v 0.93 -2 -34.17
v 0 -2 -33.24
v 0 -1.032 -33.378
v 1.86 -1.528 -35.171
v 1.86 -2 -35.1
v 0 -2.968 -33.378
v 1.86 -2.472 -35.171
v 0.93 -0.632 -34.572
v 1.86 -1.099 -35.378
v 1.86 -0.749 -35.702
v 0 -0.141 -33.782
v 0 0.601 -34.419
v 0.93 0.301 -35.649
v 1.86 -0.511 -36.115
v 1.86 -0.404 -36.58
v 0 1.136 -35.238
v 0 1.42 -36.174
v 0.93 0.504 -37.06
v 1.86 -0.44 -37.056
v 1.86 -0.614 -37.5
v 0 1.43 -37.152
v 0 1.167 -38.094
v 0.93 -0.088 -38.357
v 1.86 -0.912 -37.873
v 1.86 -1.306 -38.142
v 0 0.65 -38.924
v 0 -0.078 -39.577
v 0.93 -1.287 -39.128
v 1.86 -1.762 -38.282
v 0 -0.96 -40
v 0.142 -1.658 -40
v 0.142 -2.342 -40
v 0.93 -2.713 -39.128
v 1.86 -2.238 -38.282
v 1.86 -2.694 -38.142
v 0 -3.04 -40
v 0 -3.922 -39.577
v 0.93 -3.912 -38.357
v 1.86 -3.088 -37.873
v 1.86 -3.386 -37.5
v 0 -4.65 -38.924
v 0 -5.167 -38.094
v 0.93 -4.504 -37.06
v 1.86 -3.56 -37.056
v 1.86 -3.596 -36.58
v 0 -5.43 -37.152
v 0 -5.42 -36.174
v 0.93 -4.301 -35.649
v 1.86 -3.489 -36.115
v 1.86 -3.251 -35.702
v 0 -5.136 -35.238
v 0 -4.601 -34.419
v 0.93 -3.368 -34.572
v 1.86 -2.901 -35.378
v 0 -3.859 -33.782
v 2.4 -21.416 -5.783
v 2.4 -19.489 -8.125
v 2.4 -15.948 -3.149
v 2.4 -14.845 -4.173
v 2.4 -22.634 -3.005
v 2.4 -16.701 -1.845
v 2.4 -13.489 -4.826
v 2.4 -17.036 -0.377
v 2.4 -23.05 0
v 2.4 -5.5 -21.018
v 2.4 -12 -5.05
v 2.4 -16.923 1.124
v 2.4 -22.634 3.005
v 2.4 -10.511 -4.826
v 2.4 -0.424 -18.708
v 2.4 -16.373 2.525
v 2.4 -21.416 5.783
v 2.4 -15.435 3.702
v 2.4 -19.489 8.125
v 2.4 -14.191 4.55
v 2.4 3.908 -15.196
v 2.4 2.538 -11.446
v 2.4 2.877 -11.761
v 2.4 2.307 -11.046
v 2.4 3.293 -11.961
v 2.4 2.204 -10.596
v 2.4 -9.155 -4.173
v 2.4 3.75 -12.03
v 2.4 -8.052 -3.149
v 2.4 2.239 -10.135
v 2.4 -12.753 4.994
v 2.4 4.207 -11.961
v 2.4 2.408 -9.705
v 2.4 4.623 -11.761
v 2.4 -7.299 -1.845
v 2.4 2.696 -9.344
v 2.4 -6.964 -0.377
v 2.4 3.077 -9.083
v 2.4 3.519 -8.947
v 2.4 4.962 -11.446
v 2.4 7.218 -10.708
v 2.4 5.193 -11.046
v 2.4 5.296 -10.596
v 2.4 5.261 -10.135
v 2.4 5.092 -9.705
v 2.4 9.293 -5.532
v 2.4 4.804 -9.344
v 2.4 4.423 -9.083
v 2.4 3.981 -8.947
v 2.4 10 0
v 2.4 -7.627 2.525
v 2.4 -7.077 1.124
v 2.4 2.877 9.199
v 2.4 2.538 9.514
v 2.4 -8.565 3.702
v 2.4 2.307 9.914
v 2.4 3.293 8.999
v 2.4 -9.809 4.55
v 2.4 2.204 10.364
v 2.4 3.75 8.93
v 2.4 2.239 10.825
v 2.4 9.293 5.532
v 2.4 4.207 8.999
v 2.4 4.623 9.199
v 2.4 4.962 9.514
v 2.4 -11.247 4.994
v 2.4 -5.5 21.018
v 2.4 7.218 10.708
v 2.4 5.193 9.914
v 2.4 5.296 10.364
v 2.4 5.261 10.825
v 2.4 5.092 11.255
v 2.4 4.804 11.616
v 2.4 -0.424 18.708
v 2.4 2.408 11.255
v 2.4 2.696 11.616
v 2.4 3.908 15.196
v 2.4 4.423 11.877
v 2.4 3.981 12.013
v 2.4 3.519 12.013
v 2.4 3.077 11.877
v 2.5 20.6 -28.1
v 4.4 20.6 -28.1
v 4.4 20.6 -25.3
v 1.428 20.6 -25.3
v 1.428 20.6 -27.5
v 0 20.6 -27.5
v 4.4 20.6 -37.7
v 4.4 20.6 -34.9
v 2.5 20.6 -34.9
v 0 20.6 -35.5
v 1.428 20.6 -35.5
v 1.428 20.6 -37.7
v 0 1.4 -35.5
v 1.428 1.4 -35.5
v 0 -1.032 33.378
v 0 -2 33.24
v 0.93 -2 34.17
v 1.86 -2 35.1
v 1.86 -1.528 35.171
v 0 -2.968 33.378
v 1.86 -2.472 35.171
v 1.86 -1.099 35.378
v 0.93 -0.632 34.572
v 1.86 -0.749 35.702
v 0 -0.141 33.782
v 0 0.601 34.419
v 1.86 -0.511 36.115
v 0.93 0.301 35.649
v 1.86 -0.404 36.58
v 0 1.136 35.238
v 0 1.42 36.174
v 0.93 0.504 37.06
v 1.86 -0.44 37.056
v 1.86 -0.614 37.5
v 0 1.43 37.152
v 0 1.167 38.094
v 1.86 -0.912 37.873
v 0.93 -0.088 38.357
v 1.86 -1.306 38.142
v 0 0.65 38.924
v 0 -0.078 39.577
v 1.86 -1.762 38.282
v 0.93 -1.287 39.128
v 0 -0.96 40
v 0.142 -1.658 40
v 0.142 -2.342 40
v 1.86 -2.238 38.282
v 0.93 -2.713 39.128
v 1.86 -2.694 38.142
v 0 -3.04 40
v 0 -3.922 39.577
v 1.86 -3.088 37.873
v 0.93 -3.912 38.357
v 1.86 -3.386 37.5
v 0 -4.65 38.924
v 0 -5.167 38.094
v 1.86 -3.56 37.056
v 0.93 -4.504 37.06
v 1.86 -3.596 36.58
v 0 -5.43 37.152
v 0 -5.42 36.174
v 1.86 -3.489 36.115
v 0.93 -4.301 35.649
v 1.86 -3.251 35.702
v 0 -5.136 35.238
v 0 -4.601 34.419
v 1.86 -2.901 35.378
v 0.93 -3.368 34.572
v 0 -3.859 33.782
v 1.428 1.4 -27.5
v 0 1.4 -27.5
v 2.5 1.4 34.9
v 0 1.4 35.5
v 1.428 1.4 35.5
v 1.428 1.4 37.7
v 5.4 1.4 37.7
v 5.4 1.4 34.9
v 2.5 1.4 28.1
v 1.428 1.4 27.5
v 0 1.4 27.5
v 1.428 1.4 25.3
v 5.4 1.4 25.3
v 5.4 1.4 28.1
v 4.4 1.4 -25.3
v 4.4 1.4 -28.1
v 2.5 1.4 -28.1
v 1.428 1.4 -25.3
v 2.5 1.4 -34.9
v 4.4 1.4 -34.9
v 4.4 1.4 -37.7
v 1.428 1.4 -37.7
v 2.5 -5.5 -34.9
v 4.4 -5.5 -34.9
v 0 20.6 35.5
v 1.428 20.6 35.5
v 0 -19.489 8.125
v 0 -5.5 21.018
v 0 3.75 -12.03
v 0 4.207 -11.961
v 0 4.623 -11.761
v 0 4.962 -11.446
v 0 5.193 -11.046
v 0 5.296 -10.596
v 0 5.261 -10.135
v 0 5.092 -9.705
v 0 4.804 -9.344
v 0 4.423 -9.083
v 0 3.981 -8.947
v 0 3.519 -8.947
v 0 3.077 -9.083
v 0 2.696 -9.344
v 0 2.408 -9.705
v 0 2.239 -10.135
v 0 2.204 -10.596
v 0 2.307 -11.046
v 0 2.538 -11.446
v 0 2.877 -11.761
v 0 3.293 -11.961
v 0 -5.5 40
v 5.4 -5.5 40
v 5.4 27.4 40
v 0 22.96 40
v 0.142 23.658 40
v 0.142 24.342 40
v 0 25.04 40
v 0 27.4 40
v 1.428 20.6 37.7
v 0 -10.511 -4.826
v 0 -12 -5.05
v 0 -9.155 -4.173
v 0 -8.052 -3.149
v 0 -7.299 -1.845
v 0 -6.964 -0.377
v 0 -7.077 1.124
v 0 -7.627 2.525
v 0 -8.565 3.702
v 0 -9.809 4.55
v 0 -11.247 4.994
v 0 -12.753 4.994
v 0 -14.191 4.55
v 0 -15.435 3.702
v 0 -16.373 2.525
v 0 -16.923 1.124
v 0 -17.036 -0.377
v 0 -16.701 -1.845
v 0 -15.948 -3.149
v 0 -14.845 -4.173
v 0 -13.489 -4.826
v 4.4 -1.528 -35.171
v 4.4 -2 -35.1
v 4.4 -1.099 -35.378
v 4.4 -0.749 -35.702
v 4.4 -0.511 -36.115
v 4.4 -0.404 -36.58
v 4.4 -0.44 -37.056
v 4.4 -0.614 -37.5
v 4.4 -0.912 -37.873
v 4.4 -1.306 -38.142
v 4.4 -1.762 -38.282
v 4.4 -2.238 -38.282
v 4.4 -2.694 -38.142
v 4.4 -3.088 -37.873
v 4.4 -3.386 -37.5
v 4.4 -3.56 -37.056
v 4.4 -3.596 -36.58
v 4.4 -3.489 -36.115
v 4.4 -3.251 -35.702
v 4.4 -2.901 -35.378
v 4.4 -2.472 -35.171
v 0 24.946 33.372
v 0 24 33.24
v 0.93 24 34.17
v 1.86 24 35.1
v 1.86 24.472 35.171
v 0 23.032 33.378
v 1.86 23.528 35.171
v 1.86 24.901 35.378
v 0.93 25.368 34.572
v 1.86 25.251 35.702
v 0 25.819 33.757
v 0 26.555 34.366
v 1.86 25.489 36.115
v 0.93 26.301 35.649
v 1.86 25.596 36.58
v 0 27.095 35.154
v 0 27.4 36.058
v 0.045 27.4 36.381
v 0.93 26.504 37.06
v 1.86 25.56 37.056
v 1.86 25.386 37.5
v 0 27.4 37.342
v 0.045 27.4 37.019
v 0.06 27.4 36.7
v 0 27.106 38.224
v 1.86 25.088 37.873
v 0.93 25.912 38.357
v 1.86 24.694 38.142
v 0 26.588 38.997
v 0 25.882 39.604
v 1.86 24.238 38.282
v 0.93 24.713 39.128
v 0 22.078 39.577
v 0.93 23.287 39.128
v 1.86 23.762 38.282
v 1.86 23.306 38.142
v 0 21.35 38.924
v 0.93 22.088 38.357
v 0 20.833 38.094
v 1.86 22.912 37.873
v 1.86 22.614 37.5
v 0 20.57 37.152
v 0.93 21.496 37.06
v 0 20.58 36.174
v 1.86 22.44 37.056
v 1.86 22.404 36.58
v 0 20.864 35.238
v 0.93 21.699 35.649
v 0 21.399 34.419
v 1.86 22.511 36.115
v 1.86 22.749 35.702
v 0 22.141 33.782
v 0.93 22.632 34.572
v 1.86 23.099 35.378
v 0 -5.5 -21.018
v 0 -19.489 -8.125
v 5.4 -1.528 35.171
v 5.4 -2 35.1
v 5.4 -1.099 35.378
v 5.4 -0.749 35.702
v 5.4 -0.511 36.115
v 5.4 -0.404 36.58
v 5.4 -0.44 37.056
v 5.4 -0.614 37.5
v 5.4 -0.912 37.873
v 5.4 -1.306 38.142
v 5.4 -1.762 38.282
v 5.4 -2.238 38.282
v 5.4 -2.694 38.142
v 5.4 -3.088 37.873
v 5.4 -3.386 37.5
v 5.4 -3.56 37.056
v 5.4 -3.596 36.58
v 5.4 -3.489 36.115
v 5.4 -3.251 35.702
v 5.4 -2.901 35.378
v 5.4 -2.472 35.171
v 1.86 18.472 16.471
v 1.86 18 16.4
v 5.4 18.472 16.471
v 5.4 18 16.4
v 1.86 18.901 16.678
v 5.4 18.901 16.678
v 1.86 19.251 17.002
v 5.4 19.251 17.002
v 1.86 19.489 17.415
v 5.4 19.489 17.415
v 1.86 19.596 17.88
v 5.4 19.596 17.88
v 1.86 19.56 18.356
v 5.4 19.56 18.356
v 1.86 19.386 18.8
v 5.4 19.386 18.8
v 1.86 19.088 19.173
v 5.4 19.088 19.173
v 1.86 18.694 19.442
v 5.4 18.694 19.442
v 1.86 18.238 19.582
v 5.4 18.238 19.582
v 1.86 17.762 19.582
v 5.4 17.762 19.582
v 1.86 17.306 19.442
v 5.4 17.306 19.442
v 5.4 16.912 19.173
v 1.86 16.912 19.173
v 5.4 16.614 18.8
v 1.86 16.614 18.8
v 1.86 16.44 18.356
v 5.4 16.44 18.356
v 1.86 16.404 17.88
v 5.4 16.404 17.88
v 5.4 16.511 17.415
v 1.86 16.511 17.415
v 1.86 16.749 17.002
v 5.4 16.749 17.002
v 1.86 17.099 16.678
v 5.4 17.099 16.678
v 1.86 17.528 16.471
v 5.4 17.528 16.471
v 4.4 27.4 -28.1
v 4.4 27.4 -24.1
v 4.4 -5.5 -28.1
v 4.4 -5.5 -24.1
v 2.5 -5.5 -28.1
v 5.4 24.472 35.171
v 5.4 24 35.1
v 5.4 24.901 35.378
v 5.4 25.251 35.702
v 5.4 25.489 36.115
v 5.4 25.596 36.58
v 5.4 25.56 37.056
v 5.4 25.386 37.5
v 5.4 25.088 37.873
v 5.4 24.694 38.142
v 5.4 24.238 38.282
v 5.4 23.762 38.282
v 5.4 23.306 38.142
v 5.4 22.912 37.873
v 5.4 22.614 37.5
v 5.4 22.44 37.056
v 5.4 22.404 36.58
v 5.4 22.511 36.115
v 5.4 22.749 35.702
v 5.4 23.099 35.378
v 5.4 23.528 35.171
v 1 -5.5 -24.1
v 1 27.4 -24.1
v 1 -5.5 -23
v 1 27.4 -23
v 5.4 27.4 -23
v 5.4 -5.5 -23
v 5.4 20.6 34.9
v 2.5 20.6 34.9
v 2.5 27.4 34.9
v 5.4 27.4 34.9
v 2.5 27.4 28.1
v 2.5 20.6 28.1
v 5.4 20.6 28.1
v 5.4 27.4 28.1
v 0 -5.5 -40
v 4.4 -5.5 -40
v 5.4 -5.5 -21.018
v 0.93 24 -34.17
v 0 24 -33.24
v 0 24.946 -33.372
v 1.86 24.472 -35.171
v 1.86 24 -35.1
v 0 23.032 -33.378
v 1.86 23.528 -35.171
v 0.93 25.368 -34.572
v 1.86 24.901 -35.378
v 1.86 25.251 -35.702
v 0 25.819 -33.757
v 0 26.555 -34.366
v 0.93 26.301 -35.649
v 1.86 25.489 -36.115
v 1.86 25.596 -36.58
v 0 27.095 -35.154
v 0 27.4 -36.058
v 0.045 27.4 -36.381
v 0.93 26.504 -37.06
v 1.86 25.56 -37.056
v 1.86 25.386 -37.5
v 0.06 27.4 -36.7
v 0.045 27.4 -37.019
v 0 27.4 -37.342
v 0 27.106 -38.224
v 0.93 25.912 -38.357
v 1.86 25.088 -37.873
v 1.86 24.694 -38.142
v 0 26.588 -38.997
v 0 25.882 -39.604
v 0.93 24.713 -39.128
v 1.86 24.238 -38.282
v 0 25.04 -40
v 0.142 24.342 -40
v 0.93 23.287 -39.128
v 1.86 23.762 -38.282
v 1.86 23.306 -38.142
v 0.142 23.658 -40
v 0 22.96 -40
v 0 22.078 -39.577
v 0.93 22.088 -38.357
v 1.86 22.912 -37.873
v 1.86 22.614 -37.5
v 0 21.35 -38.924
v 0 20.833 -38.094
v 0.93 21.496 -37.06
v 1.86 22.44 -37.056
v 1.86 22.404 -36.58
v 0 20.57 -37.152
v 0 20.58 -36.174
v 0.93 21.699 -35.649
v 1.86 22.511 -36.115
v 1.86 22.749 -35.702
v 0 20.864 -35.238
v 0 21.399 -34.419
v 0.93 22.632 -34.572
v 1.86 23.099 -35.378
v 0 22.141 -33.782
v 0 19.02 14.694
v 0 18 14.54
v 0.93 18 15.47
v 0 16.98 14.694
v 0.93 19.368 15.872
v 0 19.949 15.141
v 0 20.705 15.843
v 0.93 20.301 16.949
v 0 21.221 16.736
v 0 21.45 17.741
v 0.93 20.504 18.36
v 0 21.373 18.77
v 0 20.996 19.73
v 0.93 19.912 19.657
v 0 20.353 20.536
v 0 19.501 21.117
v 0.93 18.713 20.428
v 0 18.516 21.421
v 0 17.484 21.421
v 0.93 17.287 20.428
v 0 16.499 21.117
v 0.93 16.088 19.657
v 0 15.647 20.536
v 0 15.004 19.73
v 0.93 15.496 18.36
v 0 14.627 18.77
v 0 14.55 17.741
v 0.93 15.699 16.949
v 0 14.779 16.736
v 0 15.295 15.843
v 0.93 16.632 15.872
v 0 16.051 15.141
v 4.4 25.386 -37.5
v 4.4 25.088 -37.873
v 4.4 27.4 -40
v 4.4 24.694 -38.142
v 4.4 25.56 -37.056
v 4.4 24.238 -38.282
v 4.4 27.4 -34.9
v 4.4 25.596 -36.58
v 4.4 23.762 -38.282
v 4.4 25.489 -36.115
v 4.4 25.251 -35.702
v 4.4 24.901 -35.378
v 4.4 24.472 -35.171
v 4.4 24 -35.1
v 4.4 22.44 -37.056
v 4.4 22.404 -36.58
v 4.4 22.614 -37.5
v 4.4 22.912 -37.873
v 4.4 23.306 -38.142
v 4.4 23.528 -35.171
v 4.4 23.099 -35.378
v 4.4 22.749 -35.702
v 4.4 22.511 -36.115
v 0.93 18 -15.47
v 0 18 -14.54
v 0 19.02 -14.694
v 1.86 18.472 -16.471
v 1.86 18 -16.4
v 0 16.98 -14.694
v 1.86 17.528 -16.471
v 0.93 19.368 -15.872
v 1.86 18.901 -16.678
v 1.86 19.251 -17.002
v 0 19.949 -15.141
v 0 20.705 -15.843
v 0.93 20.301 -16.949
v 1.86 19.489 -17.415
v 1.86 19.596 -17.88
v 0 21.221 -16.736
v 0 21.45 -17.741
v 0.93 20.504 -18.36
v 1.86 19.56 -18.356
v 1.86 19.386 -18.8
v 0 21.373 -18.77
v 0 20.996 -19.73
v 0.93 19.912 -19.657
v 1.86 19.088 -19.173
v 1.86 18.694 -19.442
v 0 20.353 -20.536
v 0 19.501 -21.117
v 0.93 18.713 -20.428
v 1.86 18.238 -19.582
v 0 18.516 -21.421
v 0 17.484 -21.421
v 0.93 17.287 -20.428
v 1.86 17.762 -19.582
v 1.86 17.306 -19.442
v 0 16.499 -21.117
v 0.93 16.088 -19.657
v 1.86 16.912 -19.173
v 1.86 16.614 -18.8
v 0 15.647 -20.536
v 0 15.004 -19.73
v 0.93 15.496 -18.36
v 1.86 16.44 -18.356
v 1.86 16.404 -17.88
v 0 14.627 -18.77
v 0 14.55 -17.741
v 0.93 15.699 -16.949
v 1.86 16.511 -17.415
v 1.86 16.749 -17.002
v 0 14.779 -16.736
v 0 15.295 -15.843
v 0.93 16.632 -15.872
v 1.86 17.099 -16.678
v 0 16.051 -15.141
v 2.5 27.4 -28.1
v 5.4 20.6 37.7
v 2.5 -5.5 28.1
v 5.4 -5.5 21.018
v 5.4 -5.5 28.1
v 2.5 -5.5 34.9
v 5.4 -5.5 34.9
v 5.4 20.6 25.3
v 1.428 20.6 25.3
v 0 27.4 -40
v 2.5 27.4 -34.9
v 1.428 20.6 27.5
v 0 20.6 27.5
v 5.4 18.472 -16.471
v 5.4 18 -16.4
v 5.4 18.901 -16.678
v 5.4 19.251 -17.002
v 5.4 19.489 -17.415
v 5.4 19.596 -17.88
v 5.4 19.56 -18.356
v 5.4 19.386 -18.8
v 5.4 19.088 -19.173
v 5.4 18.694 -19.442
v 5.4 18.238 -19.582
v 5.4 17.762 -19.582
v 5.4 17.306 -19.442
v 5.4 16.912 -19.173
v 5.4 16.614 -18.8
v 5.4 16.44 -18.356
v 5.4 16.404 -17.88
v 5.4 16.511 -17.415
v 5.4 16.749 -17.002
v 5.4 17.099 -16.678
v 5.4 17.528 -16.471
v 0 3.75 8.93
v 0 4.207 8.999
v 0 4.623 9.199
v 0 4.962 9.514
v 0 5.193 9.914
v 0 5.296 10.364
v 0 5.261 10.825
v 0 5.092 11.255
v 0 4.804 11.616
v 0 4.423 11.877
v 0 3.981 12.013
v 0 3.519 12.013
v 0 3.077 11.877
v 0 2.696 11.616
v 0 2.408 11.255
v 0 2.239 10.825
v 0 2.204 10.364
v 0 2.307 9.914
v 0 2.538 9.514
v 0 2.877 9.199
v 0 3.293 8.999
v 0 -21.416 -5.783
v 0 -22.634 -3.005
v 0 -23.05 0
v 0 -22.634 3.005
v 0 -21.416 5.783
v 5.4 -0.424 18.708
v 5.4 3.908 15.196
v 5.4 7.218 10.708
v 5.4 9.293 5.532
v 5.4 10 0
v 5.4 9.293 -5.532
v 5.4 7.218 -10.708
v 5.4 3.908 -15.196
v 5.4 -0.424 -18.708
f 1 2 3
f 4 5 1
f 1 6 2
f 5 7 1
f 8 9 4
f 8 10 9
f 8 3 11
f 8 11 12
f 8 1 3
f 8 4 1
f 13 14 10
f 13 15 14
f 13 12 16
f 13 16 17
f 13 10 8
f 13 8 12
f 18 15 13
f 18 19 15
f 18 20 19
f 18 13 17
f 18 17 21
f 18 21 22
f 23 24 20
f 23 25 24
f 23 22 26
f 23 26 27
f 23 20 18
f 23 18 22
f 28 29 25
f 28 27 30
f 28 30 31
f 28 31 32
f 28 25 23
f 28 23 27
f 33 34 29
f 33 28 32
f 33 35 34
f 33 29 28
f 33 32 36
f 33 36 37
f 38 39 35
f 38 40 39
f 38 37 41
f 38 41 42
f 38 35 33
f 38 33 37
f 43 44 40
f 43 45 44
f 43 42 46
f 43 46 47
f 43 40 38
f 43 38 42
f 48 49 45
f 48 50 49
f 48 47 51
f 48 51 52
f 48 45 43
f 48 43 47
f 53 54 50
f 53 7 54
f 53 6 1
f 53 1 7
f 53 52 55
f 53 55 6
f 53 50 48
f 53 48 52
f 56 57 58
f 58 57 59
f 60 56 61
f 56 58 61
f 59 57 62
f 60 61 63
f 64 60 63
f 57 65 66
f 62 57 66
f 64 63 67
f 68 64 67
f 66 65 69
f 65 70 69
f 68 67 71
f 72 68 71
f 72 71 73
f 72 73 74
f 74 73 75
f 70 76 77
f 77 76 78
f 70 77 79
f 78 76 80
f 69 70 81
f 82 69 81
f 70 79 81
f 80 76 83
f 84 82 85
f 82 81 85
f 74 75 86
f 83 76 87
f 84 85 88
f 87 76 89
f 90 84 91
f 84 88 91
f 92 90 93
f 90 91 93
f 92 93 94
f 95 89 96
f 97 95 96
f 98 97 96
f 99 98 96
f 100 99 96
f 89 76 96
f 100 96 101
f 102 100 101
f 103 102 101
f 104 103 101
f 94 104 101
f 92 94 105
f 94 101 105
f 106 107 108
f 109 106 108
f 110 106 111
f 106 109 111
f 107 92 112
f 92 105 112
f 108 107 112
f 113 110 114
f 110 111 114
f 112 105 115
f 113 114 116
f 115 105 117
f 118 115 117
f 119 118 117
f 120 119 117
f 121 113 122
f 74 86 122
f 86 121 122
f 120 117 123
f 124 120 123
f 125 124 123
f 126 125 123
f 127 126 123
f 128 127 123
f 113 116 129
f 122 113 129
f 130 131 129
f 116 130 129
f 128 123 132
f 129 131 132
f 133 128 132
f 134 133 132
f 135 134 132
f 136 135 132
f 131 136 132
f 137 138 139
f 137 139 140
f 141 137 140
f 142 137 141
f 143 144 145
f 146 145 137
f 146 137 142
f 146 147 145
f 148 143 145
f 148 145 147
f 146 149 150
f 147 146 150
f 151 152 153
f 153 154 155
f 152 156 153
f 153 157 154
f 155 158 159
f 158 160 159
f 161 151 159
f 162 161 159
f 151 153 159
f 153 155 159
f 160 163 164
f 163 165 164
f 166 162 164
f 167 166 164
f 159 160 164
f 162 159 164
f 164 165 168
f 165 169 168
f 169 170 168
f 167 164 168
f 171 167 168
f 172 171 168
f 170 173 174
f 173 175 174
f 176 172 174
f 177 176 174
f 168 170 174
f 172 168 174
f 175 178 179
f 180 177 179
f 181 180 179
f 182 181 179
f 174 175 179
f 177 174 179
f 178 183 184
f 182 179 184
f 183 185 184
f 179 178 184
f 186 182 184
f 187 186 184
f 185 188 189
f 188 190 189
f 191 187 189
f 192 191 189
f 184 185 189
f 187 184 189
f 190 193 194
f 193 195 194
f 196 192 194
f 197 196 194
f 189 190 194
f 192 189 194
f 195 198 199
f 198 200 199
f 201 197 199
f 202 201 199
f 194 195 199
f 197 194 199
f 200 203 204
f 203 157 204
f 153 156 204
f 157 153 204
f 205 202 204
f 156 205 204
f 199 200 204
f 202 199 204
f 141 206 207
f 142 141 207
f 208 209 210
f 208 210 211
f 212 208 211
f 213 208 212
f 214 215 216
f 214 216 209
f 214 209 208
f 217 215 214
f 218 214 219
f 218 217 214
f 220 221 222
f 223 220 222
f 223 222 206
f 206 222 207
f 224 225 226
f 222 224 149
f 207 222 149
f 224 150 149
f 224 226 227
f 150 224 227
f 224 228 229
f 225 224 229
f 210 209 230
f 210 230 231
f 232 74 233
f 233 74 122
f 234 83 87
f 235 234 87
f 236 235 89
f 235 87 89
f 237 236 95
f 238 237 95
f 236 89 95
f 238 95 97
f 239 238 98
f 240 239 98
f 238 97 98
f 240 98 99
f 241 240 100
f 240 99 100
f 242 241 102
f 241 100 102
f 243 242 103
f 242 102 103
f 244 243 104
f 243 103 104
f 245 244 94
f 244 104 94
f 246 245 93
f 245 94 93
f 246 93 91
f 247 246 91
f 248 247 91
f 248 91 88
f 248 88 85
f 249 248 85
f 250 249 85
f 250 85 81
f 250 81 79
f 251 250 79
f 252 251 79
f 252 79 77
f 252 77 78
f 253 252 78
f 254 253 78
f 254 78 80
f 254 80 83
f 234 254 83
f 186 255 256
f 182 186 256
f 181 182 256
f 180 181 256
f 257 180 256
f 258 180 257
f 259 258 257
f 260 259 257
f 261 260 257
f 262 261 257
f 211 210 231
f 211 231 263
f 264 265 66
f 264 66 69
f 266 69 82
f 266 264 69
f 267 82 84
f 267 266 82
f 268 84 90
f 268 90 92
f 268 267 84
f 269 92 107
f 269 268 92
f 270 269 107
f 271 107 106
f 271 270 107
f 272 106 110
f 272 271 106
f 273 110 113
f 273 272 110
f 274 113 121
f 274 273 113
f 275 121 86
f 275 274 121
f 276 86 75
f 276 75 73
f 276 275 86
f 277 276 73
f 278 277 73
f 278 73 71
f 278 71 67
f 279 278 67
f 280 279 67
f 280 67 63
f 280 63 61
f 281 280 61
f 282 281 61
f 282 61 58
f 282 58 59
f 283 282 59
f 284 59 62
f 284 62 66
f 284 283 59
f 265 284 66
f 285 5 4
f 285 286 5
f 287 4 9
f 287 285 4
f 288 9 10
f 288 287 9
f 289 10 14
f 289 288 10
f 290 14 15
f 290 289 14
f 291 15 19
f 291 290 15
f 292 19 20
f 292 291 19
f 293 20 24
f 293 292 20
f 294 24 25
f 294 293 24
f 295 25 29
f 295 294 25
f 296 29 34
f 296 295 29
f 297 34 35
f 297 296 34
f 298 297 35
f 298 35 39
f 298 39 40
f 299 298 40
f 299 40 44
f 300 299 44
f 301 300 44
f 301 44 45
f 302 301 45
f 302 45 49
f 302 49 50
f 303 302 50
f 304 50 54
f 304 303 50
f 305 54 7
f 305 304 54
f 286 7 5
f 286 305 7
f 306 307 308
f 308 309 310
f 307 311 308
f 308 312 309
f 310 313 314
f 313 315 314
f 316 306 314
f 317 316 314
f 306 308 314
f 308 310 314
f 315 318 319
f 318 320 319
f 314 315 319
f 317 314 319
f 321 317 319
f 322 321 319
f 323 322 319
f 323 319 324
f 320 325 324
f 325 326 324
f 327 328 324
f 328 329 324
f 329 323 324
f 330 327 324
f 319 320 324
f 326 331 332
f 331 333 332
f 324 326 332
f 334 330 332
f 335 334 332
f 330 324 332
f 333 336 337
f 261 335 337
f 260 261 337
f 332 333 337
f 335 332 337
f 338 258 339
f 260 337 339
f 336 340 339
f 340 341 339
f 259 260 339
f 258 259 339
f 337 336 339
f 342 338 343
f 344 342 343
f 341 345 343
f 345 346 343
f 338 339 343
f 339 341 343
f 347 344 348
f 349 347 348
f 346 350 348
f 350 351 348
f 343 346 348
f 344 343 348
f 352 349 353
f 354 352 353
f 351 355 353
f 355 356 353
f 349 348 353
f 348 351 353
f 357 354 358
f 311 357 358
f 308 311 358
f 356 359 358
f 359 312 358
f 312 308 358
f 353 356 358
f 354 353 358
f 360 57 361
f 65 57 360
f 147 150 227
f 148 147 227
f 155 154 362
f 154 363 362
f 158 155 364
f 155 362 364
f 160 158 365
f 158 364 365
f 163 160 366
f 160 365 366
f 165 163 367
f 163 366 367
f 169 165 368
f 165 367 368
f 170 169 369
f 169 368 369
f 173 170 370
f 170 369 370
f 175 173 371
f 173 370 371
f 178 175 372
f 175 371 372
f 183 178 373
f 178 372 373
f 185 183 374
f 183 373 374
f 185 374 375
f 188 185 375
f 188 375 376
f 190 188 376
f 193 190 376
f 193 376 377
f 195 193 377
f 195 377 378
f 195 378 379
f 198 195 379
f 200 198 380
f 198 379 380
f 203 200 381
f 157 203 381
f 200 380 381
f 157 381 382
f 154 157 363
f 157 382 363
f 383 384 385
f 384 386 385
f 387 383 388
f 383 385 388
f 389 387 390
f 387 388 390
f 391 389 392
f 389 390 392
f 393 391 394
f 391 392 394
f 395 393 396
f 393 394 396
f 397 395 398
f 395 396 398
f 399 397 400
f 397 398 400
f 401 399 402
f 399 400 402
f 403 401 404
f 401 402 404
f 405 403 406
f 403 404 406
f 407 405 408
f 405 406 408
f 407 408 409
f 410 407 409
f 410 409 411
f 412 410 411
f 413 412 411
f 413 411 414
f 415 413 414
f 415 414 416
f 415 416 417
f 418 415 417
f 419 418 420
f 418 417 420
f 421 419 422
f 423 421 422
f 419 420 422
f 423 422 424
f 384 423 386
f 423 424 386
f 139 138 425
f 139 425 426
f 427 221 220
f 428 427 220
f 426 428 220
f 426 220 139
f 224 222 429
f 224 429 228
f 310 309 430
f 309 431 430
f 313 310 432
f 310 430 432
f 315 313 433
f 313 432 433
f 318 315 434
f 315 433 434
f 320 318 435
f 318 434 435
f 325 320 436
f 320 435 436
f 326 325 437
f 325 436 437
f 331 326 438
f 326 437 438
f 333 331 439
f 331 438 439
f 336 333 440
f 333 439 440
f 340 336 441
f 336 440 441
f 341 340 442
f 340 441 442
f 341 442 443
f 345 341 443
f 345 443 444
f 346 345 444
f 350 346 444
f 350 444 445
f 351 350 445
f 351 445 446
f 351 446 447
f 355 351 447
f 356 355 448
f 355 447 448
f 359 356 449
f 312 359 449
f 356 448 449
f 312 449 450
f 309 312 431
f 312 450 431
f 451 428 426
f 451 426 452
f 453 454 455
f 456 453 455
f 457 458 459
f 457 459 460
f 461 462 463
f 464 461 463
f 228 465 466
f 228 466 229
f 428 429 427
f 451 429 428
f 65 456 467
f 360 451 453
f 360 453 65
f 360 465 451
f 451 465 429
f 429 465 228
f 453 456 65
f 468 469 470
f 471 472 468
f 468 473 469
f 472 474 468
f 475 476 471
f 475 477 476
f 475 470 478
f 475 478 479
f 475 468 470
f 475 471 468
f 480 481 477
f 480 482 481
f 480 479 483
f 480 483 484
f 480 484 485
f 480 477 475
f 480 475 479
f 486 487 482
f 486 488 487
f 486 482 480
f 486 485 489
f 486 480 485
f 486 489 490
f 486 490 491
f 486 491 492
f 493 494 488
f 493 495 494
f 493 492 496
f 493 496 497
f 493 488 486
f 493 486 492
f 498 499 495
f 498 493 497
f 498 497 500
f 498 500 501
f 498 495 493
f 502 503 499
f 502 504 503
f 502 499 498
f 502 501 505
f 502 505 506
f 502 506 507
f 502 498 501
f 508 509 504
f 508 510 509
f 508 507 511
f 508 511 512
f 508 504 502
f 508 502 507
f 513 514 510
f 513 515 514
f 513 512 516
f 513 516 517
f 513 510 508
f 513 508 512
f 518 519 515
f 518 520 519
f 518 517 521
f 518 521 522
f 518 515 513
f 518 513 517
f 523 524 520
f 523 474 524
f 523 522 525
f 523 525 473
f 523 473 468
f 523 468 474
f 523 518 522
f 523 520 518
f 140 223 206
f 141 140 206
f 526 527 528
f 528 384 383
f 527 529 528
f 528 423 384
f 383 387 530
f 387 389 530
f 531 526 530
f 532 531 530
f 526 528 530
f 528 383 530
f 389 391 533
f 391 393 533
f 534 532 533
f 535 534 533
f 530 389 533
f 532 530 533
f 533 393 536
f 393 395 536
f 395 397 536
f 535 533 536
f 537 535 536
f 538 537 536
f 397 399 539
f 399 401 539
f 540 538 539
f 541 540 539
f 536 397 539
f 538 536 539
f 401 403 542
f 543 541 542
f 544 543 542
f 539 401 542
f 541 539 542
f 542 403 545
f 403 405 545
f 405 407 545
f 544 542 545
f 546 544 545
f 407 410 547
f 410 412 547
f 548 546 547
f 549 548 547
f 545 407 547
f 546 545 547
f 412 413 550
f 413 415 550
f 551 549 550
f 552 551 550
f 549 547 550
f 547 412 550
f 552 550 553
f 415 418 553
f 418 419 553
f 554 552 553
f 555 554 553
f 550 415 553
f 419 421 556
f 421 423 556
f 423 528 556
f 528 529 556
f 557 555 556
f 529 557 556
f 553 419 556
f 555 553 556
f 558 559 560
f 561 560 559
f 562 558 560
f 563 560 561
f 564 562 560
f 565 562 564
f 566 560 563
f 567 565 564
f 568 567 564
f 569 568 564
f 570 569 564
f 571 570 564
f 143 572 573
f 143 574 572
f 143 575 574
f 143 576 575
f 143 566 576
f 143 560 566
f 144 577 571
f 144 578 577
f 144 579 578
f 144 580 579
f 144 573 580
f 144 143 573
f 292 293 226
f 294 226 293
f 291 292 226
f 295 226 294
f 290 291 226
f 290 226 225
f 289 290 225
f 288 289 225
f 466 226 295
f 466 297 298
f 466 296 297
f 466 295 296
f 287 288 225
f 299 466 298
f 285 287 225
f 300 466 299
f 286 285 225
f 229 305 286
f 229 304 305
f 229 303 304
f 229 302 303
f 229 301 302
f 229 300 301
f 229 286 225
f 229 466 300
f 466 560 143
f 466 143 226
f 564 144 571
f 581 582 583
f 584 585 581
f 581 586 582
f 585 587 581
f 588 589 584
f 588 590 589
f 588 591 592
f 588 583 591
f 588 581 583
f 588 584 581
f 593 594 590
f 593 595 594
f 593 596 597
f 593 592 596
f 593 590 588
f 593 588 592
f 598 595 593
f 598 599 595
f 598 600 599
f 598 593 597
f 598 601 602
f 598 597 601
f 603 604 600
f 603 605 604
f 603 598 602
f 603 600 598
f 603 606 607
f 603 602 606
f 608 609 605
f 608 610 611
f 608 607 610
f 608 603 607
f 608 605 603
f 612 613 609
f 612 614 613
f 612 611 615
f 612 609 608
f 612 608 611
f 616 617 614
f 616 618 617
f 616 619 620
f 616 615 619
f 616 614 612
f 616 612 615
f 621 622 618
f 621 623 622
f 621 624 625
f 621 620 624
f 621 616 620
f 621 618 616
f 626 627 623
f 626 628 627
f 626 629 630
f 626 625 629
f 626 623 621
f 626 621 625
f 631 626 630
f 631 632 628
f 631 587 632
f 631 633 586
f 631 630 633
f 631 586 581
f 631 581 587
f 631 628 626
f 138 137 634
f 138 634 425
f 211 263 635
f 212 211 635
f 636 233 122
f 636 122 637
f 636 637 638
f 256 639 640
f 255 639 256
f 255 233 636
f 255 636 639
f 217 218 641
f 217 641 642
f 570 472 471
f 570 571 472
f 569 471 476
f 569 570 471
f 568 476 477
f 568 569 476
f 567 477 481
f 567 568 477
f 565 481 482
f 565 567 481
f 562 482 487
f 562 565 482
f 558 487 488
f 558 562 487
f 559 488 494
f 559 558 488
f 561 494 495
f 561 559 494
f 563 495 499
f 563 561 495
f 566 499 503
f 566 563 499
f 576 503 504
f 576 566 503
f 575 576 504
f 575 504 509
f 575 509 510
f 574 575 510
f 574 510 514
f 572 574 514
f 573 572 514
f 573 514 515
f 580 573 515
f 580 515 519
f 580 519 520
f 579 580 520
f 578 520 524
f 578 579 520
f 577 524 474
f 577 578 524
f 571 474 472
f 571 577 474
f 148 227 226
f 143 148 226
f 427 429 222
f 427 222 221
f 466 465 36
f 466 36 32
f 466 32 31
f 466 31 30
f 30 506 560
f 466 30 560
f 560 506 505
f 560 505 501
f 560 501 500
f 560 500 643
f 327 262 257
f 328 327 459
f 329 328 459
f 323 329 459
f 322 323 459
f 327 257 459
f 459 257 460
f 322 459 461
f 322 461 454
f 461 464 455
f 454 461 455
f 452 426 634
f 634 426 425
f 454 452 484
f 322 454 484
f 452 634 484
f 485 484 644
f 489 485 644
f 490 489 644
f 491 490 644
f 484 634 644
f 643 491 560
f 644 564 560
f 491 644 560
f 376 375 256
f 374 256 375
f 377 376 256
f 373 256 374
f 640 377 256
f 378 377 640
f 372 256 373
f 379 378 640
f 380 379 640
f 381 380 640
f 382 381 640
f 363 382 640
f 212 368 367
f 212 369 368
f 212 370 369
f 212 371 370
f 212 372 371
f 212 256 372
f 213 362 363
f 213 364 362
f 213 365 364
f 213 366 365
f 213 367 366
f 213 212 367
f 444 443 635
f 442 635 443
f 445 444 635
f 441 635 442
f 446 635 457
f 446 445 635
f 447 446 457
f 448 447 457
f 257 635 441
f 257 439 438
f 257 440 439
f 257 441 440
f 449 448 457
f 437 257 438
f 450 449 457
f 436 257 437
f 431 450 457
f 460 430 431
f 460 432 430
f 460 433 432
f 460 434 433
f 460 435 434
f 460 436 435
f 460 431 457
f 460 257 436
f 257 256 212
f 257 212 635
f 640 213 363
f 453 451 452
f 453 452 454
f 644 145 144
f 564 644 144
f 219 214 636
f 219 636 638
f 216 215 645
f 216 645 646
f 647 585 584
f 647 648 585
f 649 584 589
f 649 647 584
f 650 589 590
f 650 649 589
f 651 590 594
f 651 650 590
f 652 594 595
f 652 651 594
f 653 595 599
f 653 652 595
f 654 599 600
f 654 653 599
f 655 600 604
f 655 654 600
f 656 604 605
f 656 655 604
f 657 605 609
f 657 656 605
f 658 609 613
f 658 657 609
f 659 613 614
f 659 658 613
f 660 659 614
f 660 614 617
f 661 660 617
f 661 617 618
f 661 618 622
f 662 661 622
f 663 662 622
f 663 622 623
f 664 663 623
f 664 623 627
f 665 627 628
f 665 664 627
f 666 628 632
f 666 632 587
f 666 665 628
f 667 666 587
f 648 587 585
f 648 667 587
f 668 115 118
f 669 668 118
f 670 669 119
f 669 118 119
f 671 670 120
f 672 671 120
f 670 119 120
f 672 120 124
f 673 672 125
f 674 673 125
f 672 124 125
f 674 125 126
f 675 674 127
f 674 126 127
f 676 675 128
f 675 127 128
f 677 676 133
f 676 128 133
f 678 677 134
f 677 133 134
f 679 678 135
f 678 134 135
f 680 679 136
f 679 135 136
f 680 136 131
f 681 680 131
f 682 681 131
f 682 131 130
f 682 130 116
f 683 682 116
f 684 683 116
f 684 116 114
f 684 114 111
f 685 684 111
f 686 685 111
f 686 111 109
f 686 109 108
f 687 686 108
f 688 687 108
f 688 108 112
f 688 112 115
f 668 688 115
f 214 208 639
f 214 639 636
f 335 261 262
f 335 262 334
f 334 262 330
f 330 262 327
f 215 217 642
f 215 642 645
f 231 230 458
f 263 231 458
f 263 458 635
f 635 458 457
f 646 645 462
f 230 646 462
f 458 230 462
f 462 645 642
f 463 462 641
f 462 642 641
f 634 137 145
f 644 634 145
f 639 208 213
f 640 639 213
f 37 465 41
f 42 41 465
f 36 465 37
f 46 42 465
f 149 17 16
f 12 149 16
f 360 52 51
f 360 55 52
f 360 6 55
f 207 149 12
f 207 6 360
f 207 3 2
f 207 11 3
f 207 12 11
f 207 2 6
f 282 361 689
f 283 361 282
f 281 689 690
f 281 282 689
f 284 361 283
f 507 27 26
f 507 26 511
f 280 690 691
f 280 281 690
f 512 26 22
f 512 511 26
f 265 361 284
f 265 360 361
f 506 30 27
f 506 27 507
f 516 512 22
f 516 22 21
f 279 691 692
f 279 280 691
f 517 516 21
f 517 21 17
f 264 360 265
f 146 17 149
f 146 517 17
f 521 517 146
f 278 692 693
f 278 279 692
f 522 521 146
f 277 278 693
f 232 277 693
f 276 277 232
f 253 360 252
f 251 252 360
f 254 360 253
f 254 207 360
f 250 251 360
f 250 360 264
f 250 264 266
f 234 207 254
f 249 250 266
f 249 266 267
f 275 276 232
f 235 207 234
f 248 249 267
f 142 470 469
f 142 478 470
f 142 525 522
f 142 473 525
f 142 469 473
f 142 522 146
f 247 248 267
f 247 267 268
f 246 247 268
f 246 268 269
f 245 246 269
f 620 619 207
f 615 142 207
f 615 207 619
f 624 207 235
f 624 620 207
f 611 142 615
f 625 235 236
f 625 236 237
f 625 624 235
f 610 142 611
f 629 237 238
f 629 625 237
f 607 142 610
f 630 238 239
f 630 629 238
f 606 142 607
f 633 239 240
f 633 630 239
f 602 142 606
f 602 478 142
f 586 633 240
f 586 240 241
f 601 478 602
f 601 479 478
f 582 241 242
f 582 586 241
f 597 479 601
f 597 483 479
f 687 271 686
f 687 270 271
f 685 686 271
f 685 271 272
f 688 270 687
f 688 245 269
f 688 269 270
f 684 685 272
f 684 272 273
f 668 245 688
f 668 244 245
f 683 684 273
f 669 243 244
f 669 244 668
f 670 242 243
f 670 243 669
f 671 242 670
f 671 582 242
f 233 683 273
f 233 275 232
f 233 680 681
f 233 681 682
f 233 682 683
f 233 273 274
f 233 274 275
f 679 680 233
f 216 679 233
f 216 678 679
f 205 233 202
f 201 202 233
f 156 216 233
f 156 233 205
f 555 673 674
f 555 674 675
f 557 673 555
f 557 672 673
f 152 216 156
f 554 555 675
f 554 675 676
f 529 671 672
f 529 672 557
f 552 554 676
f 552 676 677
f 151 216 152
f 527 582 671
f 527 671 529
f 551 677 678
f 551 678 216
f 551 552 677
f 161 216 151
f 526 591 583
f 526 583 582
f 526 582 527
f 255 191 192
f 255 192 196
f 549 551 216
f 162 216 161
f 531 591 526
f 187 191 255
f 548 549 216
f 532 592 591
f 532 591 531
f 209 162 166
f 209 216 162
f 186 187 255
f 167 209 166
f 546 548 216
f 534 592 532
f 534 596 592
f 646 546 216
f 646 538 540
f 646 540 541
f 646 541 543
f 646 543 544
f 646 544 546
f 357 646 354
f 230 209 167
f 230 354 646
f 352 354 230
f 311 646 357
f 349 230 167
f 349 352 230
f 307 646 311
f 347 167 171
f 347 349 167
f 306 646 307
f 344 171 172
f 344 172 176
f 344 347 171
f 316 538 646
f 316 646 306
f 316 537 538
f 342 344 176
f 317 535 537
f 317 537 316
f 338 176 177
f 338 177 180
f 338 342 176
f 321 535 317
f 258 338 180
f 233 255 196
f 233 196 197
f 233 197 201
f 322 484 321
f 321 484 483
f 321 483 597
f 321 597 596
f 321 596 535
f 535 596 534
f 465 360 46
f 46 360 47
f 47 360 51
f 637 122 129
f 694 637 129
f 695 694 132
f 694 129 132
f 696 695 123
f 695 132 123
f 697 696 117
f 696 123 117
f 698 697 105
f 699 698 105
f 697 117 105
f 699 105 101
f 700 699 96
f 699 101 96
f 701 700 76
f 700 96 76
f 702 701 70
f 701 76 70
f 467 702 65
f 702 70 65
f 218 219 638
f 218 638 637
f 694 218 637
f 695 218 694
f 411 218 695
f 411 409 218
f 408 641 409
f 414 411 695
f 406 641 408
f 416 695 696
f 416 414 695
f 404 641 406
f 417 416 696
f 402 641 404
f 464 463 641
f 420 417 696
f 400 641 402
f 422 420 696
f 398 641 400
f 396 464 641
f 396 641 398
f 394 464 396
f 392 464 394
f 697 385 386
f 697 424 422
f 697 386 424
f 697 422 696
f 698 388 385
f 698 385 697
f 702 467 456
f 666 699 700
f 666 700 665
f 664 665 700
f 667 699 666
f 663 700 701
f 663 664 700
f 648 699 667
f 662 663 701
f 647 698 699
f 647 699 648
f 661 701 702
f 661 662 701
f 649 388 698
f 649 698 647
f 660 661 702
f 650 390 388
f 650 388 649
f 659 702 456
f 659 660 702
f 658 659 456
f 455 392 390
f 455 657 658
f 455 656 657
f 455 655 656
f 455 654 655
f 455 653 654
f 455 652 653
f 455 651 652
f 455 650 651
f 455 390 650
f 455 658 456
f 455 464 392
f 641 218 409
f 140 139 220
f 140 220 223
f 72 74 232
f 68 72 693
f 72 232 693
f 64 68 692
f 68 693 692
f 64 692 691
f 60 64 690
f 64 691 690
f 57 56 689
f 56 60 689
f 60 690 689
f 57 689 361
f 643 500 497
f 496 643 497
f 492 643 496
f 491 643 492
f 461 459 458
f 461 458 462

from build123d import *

# Parameters (mm, degrees)
ESQUISSE2_W                                       = 80
ESQUISSE2_H                                       = 85
PLAQUE_DEPTH                                      = 5.4
ESQUISSE15_R                                      = 22
D_GAGEMENT_ROUE_DEPTH                             = 81.678373806
D_COUPE_INF_RIEURE_DEPTH                          = 81.803217758
ESQUISSE14_R                                      = 11.05
ESQUISSE14_R_2                                    = 5.05
RENFORT_ROULEMENT_DEPTH                           = 2.4
D_COUPE_SUP_RIEURE_DEPTH                          = 81.803217758
D_GAGEMENT_AXE_6_DEPTH                            = 75.400336021
D_GAGEMENT_AXE_6_DEPTH_BACK                       = 75.400336021
ESQUISSE26_W                                      = 6.8
ESQUISSE26_H                                      = 6.8
D_GAGEMENT_START                                  = 1.4
D_GAGEMENT_DOUILLE_DEPTH                          = 19.2
R_P_TITION_LIN_AIRE1_COUNT                        = 2
R_P_TITION_LIN_AIRE1_PITCH                        = 26
MORS_D_FORMABLE_DOUILLE_DEPTH                     = 75.400336021
MORS_D_FORMABLE_DOUILLE_DEPTH_BACK                = 75.400336021
FRAISAGE_POUR_VIS_T_TE_FRAIS_E_BOMB_E_D           = 3.2
FRAISAGE_POUR_VIS_T_TE_FRAIS_E_BOMB_E_CSINK_D     = 6.92
FRAISAGE_POUR_VIS_T_TE_FRAIS_E_BOMB_E_CSINK_ANGLE = 90
ESQUISSE31_W                                      = 80
ESQUISSE31_H                                      = 35.1
ENL_V_MAT_EXTRU_1_DEPTH                           = 5.4
BOSS_EXTRU_1_DEPTH                                = 2.4
ESQUISSE34_R                                      = 1.55
ENL_V_MAT_EXTRU_2_DEPTH                           = 10


with BuildPart() as part:
    # Esquisse2 → plaque (new body)
    with BuildSketch(Plane(origin=(0, 0, 0), x_dir=(0, 0, -1), z_dir=(1, 0, 0))):
        with Locations((0, 27.5)):
            Rectangle(ESQUISSE2_W, ESQUISSE2_H)
    extrude(amount=PLAQUE_DEPTH)

    # Esquisse15 → dégagement roue (cut, through all)
    with BuildSketch(Plane.ZY.offset(-2.4)):
        with Locations((0, -12)):
            Circle(ESQUISSE15_R)
    extrude(amount=-D_GAGEMENT_ROUE_DEPTH, mode=Mode.SUBTRACT)

    # Esquisse18 → découpe_inférieure (cut, through all)
    with BuildSketch(Plane(origin=(0, 0, 0), x_dir=(0, 0, -1), z_dir=(1, 0, 0))):
        Polygon((-7.446869682, -5.5), (-40, -5.5), (-40, -15), (40, -15), (40, -5.5), (7.446869682, -5.5), align=None)
    extrude(amount=D_COUPE_INF_RIEURE_DEPTH, mode=Mode.SUBTRACT)

    # Esquisse14 → renfort_roulement (add)
    with BuildSketch(Plane(origin=(0, 0, 0), x_dir=(0, 0, -1), z_dir=(1, 0, 0))):
        with Locations((0, -12)):
            Circle(ESQUISSE14_R)
        with Locations((0, -12)):
            Circle(ESQUISSE14_R_2, mode=Mode.SUBTRACT)
    extrude(amount=RENFORT_ROULEMENT_DEPTH)

    # Esquisse20 → découpe_supérieure (cut, through all)
    with BuildSketch(Plane(origin=(0, 0, 0), x_dir=(0, 0, -1), z_dir=(1, 0, 0))):
        with BuildLine():
            Line((-40, 70), (40, 70))
            Line((40, 70), (40, 62.5))
            Line((40, 62.5), (26, 62.5))
            ThreePointArc((26, 62.5), (22.956192855, 61.466766701), (21.170370869, 58.794095226))
            Line((21.170370869, 58.794095226), (15.559208556, 37.852952387))
            ThreePointArc((15.559208556, 37.852952387), (14.666297563, 36.516616649), (13.144393991, 36))
            Line((13.144393991, 36), (-13.144393991, 36))
            ThreePointArc((-13.144393991, 36), (-14.666297563, 36.516616649), (-15.559208556, 37.852952387))
            Line((-15.559208556, 37.852952387), (-21.170370869, 58.794095226))
            ThreePointArc((-21.170370869, 58.794095226), (-22.956192855, 61.466766701), (-26, 62.5))
            Line((-26, 62.5), (-40, 62.5))
            Line((-40, 62.5), (-40, 70))
        make_face()
    extrude(amount=D_COUPE_SUP_RIEURE_DEPTH, mode=Mode.SUBTRACT)

    # Esquisse26 → dégagement axe 6 (cut, two sides: drawn at the far end of the back side and taken through both)
    with BuildSketch(Plane(origin=(0, 0, 0), x_dir=(1, 0, 0), z_dir=(0, 1, 0)).offset(-D_GAGEMENT_AXE_6_DEPTH_BACK)):
        with Locations((5.9, 31.5)):
            Rectangle(ESQUISSE26_W, ESQUISSE26_H)
        with Locations((5.9, -31.5)):
            Rectangle(ESQUISSE26_W, ESQUISSE26_H)
    extrude(amount=D_GAGEMENT_AXE_6_DEPTH + D_GAGEMENT_AXE_6_DEPTH_BACK, mode=Mode.SUBTRACT)

    # Esquisse28 → dégagement douille (cut)
    with BuildSketch(Plane(origin=(0, 0, 0), x_dir=(1, 0, 0), z_dir=(0, 1, 0)).offset(D_GAGEMENT_START)):
        Polygon((0, 35.5), (1.427864045, 35.5), (1.427864045, 37.7), (10.372135955, 37.7), (10.372135955, 25.3), (1.427864045, 25.3), (1.427864045, 27.5), (0, 27.5), align=None)
        Polygon((10.372135955, -25.3), (1.427864045, -25.3), (1.427864045, -27.5), (0, -27.5), (0, -35.5), (1.427864045, -35.5), (1.427864045, -37.7), (10.372135955, -37.7), align=None)
    d_gagement_douille = extrude(amount=D_GAGEMENT_DOUILLE_DEPTH, mode=Mode.SUBTRACT)

    # Répétition linéaire1: dégagement douille ×2
    with Locations(*[(0, i * R_P_TITION_LIN_AIRE1_PITCH, 0) for i in range(1, R_P_TITION_LIN_AIRE1_COUNT)]):
        add(d_gagement_douille, mode=Mode.SUBTRACT)

    # Esquisse19 → Mors_déformable_douille (cut, two sides: drawn at the far end of the back side and taken through both)
    with BuildSketch(Plane(origin=(0, 0, 0), x_dir=(1, 0, 0), z_dir=(0, 1, 0)).offset(-MORS_D_FORMABLE_DOUILLE_DEPTH_BACK)):
        Polygon((5.4, 40), (4.4, 40), (4.4, 24.1), (1, 24.1), (1, 23), (5.4, 23), align=None)
    extrude(amount=MORS_D_FORMABLE_DOUILLE_DEPTH + MORS_D_FORMABLE_DOUILLE_DEPTH_BACK, mode=Mode.SUBTRACT)

    # Fraisage pour vis à tête fraisée bombée fendue M31 (through all)
    with Locations(Plane.ZY):
        with Locations((18, 18), (36.7, 24), (36.7, -2), (21, 34)):
            fraisage_pour_vis_t_te_frais_e_bomb_e = CounterSinkHole(FRAISAGE_POUR_VIS_T_TE_FRAIS_E_BOMB_E_D / 2, FRAISAGE_POUR_VIS_T_TE_FRAIS_E_BOMB_E_CSINK_D / 2, counter_sink_angle=FRAISAGE_POUR_VIS_T_TE_FRAIS_E_BOMB_E_CSINK_ANGLE)

    # Esquisse31 → Enlèv. mat.-Extru.1 (cut)
    with BuildSketch(Plane(origin=(5.4, 0, 0), x_dir=(0, 0, -1), z_dir=(1, 0, 0))):
        with Locations((0, 44.95)):
            Rectangle(ESQUISSE31_W, ESQUISSE31_H)
    extrude(amount=-ENL_V_MAT_EXTRU_1_DEPTH, mode=Mode.SUBTRACT)

    # Esquisse33 → Boss.-Extru.1 (add)
    with BuildSketch(Plane(origin=(2.4, 0, 0), x_dir=(0, 0, -1), z_dir=(1, 0, 0))):
        Polygon((-8.125418007, -19.488663579), (-21.017849557, -5.5), (-8.936022605, -5.5), align=None)
        Polygon((8.125418007, -19.488663579), (21.017849557, -5.5), (8.936022605, -5.5), align=None)
    extrude(amount=-BOSS_EXTRU_1_DEPTH)

    # Symétrie4: Fraisage pour vis à tête fraisée bombée fendue M31 across plane
    add(fraisage_pour_vis_t_te_frais_e_bomb_e.mirror(Plane.XY), mode=Mode.SUBTRACT)

    # Esquisse34 → Enlèv. mat.-Extru.2 (cut)
    with BuildSketch(Plane(origin=(2.4, 0, 0), x_dir=(0, 0, -1), z_dir=(1, 0, 0))):
        with Locations((-10.48, 3.75)):
            Circle(ESQUISSE34_R)
        with Locations((10.48, 3.75)):
            Circle(ESQUISSE34_R)
    extrude(amount=-ENL_V_MAT_EXTRU_2_DEPTH, mode=Mode.SUBTRACT)


solid = part.part
